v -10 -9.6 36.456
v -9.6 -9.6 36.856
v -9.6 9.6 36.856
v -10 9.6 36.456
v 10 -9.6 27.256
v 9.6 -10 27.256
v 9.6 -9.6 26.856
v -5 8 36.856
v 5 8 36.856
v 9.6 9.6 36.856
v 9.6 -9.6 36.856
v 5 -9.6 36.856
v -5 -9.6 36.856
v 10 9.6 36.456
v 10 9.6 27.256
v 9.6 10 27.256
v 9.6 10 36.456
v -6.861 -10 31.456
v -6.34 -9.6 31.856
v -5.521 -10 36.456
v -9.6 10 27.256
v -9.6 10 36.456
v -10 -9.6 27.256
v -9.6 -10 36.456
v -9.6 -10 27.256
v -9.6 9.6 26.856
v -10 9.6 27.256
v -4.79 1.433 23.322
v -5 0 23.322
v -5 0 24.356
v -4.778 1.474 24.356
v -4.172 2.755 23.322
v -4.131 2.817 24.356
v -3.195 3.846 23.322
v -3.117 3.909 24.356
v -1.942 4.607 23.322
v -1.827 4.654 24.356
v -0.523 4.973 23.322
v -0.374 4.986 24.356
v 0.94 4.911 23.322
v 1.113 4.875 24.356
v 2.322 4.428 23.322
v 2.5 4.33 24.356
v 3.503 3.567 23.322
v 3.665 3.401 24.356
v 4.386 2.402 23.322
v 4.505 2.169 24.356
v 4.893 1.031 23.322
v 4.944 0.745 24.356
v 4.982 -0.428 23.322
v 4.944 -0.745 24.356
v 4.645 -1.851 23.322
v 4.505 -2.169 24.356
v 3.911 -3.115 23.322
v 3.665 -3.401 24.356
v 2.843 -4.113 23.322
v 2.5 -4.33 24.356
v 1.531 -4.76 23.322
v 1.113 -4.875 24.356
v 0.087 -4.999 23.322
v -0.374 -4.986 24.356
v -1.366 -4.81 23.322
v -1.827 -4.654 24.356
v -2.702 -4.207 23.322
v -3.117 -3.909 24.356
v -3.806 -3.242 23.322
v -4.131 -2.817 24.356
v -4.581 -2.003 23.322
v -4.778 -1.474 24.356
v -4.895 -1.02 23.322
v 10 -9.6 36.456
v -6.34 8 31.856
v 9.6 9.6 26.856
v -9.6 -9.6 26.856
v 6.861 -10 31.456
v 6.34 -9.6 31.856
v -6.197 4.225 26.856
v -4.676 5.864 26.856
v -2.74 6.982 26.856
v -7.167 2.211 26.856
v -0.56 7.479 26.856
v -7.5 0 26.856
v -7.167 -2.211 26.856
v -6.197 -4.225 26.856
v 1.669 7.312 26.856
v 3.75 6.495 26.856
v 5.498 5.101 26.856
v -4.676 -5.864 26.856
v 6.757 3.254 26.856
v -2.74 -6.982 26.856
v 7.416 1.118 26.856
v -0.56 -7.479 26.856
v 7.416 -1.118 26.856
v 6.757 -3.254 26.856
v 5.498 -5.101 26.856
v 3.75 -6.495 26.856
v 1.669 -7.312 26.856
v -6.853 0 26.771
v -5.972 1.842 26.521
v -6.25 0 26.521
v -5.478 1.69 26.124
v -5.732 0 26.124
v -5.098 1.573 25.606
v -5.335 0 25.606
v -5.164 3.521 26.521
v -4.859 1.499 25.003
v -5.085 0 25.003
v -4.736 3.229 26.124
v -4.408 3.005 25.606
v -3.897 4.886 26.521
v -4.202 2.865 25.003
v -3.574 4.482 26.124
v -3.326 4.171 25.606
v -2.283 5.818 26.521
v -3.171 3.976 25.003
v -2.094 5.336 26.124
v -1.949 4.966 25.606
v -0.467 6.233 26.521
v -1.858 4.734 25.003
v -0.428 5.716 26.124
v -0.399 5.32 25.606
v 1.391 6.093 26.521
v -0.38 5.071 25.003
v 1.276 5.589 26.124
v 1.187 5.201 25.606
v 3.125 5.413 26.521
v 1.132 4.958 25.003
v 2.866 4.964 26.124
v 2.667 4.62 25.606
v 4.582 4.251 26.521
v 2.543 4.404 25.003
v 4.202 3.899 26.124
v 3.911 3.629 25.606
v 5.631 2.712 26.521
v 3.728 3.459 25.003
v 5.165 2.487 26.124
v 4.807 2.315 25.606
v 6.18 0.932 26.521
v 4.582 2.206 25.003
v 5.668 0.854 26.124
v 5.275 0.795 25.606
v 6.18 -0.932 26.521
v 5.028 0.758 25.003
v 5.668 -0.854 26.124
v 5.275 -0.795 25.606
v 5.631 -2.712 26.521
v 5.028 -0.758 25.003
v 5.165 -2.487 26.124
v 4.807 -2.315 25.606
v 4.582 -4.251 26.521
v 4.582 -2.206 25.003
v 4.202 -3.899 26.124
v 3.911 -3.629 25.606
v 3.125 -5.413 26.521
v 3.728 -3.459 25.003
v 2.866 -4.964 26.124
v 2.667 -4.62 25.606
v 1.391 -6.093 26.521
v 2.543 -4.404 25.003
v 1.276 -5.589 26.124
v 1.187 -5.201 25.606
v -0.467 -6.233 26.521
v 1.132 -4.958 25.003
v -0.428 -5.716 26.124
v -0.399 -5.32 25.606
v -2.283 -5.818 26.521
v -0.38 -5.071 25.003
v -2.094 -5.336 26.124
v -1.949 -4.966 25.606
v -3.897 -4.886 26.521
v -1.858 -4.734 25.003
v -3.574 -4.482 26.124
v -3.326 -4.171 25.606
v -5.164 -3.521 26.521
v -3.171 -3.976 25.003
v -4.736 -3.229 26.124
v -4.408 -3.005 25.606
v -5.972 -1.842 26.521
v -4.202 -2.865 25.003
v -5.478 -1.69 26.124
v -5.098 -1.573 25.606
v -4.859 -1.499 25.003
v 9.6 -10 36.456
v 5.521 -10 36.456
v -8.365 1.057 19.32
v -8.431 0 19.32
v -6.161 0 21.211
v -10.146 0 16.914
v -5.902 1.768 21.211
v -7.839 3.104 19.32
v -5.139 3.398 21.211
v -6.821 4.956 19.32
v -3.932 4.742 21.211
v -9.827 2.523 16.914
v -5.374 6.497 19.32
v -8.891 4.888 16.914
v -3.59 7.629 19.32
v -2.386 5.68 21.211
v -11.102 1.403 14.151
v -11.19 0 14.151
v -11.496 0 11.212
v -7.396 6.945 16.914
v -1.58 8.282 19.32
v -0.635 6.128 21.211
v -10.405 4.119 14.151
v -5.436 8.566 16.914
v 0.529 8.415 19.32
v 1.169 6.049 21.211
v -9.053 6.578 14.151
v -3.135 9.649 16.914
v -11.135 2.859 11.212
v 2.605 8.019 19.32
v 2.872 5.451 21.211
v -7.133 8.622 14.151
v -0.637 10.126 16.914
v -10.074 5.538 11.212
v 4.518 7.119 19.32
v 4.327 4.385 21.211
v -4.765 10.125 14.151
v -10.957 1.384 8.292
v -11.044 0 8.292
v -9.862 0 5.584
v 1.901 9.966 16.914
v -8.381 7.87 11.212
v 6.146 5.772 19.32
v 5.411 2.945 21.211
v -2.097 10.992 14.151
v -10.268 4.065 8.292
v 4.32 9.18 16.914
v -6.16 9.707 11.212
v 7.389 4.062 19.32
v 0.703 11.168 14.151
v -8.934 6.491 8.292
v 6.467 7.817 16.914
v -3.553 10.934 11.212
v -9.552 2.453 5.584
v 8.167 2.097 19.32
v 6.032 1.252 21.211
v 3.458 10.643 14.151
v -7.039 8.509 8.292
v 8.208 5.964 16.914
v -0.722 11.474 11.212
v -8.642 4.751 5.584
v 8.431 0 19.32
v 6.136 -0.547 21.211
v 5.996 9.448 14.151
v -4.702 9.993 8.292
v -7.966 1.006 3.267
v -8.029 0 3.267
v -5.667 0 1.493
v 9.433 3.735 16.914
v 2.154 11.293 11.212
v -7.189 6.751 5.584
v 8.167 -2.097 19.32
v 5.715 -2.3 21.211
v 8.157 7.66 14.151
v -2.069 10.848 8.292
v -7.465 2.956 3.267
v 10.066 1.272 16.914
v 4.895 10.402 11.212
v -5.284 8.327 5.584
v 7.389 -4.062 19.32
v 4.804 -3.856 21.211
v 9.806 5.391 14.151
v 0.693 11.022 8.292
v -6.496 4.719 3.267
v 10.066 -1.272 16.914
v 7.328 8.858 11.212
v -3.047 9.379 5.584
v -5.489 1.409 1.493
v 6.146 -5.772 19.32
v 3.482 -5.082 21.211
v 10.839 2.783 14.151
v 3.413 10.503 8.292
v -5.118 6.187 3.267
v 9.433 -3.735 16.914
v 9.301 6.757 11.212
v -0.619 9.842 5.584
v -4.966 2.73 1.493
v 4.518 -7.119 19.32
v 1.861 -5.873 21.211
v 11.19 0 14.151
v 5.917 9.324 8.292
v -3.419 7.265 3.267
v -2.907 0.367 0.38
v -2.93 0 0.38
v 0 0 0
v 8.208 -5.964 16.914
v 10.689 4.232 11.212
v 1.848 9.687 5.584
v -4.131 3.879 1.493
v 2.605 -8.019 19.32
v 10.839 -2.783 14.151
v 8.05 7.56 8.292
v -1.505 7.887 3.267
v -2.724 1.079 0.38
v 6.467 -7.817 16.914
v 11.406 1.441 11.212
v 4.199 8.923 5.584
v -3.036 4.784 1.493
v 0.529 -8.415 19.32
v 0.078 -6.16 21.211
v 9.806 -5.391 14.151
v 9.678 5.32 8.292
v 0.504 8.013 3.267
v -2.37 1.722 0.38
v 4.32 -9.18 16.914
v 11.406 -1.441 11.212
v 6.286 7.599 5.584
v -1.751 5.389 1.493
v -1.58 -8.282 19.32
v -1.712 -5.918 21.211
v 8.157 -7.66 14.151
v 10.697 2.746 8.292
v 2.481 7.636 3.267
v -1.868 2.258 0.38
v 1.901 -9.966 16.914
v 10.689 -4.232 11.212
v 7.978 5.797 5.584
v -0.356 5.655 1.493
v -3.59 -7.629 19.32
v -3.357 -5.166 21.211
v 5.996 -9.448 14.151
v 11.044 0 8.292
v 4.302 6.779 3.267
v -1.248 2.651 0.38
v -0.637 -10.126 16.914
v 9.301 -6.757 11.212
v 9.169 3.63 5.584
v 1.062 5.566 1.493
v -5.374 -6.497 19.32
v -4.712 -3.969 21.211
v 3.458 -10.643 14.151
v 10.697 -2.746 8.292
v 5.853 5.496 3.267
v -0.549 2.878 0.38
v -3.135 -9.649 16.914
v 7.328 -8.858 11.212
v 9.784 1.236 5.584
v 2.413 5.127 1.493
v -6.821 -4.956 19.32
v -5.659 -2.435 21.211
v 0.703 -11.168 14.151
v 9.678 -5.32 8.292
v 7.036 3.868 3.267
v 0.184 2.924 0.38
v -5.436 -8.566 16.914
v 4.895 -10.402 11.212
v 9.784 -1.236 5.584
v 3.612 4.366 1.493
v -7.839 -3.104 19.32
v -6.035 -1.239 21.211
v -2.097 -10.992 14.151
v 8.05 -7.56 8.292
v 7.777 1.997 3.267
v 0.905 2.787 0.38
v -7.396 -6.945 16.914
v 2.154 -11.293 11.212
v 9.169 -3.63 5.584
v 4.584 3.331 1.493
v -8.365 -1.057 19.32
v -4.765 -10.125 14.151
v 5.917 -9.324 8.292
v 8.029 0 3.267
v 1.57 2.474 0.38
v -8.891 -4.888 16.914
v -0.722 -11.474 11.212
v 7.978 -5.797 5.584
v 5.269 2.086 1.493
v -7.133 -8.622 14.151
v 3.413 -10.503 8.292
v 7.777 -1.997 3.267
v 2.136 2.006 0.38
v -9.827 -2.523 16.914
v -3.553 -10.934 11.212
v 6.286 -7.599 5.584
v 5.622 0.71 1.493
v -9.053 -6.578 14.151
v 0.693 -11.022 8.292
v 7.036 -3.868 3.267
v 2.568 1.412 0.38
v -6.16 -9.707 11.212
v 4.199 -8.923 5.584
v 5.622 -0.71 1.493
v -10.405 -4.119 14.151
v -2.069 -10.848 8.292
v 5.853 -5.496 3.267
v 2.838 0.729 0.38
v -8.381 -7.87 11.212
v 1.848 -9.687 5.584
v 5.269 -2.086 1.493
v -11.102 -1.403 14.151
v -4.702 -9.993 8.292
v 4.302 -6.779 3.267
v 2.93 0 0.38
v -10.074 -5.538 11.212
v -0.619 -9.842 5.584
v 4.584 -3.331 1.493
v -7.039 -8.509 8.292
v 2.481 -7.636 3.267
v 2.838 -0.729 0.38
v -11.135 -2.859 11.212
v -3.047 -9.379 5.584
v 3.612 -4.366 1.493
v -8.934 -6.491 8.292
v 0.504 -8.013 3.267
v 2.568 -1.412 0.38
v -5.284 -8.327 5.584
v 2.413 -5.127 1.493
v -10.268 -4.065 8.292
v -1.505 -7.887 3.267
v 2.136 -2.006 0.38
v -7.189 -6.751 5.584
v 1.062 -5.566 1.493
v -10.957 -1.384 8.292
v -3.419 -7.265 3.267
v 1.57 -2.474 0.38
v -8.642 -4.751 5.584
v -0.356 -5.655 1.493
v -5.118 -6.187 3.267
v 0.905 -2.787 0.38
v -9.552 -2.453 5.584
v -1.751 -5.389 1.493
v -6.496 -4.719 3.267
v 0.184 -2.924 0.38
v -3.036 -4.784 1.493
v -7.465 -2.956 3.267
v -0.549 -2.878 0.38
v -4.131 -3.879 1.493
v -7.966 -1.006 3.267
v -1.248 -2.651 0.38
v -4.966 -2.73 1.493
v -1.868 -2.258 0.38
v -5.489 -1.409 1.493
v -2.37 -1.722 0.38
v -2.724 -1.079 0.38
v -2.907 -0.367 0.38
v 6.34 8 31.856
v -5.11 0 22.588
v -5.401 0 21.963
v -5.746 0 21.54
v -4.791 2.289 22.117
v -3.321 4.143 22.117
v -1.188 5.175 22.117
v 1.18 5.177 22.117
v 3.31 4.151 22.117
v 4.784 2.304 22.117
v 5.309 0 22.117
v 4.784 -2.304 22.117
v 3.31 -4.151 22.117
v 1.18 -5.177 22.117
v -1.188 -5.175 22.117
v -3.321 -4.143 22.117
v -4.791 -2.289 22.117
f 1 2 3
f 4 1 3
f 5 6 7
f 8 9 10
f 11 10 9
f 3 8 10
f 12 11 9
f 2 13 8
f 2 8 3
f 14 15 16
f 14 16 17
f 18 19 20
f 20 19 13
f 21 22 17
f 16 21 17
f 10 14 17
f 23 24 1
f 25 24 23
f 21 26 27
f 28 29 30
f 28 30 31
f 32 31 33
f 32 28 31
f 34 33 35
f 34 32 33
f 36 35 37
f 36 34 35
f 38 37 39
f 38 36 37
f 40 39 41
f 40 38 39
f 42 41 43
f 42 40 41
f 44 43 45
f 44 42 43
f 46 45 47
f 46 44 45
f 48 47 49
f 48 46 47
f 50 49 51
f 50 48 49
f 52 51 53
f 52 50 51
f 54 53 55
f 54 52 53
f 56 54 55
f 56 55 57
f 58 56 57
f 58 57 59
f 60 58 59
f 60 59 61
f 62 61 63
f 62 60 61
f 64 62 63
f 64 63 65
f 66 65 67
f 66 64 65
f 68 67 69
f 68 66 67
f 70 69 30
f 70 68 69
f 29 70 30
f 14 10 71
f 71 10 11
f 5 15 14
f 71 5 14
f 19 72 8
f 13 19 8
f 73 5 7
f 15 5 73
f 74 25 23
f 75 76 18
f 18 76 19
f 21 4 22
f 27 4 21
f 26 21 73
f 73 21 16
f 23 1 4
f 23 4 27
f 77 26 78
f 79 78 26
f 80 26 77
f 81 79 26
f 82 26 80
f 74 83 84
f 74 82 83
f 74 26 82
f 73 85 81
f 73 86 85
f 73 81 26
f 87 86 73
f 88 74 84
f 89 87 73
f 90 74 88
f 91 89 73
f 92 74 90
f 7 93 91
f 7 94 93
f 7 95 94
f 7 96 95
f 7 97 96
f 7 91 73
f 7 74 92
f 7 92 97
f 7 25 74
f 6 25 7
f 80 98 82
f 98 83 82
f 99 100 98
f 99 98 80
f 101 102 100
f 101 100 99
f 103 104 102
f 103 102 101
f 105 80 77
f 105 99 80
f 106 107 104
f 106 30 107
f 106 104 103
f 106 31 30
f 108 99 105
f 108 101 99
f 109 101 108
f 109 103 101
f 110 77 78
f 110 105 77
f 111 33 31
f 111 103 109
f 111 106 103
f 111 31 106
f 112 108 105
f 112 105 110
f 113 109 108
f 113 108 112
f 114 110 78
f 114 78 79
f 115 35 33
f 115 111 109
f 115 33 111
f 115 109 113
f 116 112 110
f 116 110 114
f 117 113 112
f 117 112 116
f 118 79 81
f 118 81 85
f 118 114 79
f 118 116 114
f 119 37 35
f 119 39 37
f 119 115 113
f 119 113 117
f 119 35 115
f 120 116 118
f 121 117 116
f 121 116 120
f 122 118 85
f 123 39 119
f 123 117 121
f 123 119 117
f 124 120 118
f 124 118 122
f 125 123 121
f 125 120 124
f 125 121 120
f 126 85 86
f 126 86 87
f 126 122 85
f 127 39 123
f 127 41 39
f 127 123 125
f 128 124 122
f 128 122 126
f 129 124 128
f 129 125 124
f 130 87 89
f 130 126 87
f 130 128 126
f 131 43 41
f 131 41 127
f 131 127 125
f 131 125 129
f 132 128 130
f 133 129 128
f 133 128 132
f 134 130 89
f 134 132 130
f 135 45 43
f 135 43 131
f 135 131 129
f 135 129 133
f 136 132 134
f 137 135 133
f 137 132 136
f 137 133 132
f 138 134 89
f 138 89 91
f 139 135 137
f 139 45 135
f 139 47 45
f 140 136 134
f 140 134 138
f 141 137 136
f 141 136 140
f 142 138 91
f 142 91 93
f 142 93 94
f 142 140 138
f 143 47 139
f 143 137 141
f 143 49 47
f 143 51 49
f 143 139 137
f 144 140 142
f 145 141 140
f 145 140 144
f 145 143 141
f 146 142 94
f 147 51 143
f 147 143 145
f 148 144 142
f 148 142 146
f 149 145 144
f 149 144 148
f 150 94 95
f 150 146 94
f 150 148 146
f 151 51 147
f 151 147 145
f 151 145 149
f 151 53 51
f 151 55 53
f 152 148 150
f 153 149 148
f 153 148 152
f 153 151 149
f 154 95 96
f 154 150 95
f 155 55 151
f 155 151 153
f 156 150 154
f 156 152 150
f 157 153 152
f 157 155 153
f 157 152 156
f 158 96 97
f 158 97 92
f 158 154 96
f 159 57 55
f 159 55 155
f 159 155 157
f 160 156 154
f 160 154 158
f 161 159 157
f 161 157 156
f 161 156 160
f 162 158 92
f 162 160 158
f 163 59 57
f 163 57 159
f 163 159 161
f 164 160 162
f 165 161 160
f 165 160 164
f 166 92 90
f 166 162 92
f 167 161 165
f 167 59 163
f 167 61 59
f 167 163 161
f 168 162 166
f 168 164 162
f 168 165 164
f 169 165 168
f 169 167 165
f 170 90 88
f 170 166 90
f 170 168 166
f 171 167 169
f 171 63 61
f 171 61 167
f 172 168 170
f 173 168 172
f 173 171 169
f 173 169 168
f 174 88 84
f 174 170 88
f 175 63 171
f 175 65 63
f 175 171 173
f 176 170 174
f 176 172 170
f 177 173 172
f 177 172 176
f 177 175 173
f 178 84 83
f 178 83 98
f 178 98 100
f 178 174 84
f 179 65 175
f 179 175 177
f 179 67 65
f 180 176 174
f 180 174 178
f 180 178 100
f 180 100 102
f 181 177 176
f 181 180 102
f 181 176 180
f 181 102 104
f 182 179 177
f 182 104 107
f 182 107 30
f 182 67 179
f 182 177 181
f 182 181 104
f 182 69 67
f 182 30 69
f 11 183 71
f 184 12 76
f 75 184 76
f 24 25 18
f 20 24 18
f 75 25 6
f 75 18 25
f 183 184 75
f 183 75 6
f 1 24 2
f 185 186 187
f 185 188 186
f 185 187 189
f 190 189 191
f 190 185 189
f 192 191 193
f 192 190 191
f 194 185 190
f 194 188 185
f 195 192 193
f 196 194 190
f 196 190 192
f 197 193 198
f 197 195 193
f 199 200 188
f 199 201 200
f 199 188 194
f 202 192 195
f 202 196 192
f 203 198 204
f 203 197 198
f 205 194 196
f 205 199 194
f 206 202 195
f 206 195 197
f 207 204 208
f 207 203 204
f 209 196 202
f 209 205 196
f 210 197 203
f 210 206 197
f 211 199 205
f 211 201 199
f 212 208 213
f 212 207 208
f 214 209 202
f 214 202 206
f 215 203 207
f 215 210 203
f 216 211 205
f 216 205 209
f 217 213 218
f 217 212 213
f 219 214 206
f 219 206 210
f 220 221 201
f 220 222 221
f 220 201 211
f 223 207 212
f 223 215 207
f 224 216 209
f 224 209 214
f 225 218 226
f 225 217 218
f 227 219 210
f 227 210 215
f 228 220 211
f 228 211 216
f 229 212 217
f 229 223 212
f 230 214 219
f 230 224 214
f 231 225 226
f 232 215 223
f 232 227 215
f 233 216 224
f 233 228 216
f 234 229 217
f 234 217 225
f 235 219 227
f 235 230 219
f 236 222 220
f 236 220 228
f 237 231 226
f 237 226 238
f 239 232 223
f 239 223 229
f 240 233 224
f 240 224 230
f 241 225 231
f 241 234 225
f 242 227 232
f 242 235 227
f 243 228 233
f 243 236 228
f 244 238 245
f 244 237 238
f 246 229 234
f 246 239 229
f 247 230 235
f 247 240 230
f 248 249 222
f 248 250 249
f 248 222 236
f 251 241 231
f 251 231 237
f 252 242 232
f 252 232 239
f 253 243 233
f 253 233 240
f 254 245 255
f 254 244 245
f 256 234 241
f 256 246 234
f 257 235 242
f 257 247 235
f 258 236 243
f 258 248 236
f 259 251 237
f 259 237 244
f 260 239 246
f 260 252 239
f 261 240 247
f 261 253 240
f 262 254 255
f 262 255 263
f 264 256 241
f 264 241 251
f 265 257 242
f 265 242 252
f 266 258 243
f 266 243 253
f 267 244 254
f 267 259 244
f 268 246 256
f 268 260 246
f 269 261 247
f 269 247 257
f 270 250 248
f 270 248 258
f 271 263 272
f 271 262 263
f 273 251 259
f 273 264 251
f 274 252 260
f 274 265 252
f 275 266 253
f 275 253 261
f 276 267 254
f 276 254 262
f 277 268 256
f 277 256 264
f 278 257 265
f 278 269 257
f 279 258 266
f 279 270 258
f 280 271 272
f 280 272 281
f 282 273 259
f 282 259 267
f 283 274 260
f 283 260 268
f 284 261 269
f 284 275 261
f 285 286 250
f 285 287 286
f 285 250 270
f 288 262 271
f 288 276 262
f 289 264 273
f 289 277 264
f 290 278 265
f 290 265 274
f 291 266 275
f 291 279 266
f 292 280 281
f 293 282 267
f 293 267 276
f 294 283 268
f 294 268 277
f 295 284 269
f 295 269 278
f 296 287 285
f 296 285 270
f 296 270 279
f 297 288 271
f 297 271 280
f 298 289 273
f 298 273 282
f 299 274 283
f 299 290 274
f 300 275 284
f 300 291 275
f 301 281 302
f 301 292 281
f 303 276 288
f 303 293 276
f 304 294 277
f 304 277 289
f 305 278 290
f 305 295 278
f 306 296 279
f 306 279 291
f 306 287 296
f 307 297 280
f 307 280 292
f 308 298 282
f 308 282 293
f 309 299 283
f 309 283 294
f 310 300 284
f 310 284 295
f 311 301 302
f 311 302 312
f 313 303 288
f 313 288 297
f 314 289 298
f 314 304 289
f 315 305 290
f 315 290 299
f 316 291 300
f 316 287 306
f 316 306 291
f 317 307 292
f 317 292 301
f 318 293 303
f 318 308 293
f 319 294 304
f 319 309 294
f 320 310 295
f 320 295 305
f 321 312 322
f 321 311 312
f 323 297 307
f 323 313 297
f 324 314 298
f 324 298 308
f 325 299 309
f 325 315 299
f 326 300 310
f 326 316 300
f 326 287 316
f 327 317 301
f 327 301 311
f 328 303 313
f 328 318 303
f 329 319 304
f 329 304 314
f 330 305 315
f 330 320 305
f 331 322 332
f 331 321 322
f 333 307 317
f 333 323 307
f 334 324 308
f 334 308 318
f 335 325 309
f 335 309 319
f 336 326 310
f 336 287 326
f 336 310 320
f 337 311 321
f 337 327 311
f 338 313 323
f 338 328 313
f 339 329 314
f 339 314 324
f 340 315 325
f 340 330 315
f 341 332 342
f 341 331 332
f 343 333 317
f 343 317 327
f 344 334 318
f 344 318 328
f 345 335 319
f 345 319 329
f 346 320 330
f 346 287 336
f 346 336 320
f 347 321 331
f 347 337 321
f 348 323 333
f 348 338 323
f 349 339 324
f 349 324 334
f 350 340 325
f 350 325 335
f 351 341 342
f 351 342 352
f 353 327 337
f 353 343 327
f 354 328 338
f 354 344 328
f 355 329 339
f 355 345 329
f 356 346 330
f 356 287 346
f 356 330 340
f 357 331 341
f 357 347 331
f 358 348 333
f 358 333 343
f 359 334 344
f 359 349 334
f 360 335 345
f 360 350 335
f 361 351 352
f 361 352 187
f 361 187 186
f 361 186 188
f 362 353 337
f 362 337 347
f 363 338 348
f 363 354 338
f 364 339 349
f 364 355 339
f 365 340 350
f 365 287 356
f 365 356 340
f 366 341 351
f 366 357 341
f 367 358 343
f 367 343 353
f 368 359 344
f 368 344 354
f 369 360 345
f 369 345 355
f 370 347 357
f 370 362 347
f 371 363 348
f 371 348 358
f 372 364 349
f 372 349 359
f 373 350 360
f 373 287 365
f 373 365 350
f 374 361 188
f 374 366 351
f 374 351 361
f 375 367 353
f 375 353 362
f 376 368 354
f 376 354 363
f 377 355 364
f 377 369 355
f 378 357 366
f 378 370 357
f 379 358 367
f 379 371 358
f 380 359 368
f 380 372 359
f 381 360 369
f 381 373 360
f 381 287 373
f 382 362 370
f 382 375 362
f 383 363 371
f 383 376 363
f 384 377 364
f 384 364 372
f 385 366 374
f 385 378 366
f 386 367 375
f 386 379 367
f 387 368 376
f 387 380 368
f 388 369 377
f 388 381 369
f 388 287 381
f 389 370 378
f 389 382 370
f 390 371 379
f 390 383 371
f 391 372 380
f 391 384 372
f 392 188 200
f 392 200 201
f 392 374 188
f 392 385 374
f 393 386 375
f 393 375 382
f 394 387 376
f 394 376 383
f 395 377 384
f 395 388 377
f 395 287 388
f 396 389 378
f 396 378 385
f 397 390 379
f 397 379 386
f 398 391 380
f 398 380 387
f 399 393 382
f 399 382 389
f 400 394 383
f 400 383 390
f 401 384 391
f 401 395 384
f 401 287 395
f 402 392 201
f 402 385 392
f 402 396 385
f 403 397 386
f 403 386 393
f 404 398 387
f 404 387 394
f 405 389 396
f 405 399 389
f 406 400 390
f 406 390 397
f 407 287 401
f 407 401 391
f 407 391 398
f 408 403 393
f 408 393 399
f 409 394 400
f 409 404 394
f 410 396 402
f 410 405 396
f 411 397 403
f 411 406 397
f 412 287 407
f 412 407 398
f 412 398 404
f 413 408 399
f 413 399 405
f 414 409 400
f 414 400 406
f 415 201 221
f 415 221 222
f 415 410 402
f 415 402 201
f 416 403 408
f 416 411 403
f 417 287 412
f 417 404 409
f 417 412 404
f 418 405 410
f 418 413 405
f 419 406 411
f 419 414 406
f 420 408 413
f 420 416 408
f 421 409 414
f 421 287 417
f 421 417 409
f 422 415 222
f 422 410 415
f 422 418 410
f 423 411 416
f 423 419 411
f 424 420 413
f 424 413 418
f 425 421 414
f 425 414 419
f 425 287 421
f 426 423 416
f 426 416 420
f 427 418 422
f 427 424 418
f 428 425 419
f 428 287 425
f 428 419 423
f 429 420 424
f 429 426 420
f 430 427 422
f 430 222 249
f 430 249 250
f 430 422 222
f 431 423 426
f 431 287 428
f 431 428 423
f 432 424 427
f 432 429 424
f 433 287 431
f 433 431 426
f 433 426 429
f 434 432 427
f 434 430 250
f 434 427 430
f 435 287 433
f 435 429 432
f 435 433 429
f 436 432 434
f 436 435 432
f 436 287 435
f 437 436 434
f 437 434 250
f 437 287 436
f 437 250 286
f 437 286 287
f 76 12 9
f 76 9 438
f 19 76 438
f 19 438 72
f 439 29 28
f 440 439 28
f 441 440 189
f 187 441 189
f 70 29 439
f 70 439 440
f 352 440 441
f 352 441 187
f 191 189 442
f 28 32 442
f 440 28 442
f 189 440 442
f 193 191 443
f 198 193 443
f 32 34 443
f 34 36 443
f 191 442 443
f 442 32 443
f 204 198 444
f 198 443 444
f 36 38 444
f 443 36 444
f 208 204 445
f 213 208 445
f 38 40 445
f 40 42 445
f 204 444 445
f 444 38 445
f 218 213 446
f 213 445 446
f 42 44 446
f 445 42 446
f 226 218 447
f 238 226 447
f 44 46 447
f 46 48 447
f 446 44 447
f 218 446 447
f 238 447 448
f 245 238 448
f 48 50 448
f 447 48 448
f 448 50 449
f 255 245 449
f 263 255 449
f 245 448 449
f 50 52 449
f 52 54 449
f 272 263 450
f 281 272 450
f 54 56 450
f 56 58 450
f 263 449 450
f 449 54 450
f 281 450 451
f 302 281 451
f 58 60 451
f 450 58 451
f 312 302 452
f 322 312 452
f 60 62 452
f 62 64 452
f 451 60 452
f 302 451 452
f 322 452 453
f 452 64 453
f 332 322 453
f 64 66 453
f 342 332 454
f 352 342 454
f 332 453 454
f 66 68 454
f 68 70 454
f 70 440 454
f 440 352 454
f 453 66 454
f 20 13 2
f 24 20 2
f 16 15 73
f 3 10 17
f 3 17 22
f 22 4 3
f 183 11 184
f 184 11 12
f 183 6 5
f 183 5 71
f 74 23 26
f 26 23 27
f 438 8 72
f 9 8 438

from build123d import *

# Parameters (mm, degrees)
F6_DEPTH = 10
F7_START = -8
F7_DEPTH = 2
F9_R     = 2.5
F8_SIZE  = 0.4


with BuildPart() as f4:
    # F3 (on Front) → F4 (revolve)
    with BuildSketch(Plane.XZ):
        with BuildLine():
            ThreePointArc((-5, 21.8561575886), (-2.5645845405, 22.7103927734), (0, 23))
            Line((0, 23), (0, 26.8561575886))
            Line((0, 26.8561575886), (-5, 26.8561575886))
            Line((-5, 26.8561575886), (-5, 21.8561575886))
        make_face()
        with BuildLine():
            ThreePointArc((-5, 21.8561575886), (-11.2103927734, 8.9354154595), (0, 0))
            Line((0, 0), (0, 23))
            ThreePointArc((0, 23), (-2.5645845405, 22.7103927734), (-5, 21.8561575886))
        make_face()
    revolve(axis=Axis((0, 0, 13.4280787943), (0, 0, -1)))

    # F3 (on Front) → F5 (revolve)
    with BuildSketch(Plane.XZ):
        with BuildLine():
            ThreePointArc((-5, 21.8561575886), (-2.5645845405, 22.7103927734), (0, 23))
            Line((0, 23), (0, 26.8561575886))
            Line((0, 26.8561575886), (-5, 26.8561575886))
            Line((-5, 26.8561575886), (-5, 21.8561575886))
        make_face()
    revolve(axis=Axis((0, 0, 13.4280787943), (0, 0, -1)))

    # F3 (on Front) → F6 (join, symmetric)
    with BuildSketch(Plane.XZ):
        Polygon((0, 26.8561575886), (5, 26.8561575886), (10, 26.8561575886), (10, 36.8561575886), (5, 36.8561575886), (6.3397459622, 31.8561575886), (-6.3397459622, 31.8561575886), (-5, 36.8561575886), (-10, 36.8561575886), (-10, 26.8561575886), (-5, 26.8561575886), align=None)
    extrude(amount=F6_DEPTH, both=True)

    # F3 (on Front) → F7 (join)
    with BuildSketch(Plane.XZ.offset(F7_START)):
        Polygon((6.3397459622, 31.8561575886), (5, 36.8561575886), (-5, 36.8561575886), (-6.3397459622, 31.8561575886), align=None)
    extrude(amount=-F7_DEPTH)

    # F9
    f9_edges = [f4.edges().sort_by_distance(p)[0] for p in [
        (-5, 0, 24.356158),
        (5, 0, 21.856158),
        (5, 0, 26.856158),
    ]]
    fillet(f9_edges, radius=F9_R)

    # F8
    f8_edges = [f4.edges().sort_by_distance(p)[0] for p in [
        (0, -10, 26.856158),
        (10, -10, 31.856158),
        (7.5, -10, 36.856158),
        (5.669873, -10, 34.356158),
        (0, -10, 31.856158),
        (-5.669873, -10, 34.356158),
        (-7.5, -10, 36.856158),
        (-10, -10, 31.856158),
        (10, 0, 26.856158),
        (10, 10, 31.856158),
        (10, 0, 36.856158),
        (7.5, 0, 26.856158),
        (0, 10, 26.856158),
        (-10, 0, 26.856158),
        (-10, 0, 36.856158),
        (-10, 10, 31.856158),
        (0, 10, 36.856158),
    ]]
    chamfer(f8_edges, length=F8_SIZE)


solid = f4.part
